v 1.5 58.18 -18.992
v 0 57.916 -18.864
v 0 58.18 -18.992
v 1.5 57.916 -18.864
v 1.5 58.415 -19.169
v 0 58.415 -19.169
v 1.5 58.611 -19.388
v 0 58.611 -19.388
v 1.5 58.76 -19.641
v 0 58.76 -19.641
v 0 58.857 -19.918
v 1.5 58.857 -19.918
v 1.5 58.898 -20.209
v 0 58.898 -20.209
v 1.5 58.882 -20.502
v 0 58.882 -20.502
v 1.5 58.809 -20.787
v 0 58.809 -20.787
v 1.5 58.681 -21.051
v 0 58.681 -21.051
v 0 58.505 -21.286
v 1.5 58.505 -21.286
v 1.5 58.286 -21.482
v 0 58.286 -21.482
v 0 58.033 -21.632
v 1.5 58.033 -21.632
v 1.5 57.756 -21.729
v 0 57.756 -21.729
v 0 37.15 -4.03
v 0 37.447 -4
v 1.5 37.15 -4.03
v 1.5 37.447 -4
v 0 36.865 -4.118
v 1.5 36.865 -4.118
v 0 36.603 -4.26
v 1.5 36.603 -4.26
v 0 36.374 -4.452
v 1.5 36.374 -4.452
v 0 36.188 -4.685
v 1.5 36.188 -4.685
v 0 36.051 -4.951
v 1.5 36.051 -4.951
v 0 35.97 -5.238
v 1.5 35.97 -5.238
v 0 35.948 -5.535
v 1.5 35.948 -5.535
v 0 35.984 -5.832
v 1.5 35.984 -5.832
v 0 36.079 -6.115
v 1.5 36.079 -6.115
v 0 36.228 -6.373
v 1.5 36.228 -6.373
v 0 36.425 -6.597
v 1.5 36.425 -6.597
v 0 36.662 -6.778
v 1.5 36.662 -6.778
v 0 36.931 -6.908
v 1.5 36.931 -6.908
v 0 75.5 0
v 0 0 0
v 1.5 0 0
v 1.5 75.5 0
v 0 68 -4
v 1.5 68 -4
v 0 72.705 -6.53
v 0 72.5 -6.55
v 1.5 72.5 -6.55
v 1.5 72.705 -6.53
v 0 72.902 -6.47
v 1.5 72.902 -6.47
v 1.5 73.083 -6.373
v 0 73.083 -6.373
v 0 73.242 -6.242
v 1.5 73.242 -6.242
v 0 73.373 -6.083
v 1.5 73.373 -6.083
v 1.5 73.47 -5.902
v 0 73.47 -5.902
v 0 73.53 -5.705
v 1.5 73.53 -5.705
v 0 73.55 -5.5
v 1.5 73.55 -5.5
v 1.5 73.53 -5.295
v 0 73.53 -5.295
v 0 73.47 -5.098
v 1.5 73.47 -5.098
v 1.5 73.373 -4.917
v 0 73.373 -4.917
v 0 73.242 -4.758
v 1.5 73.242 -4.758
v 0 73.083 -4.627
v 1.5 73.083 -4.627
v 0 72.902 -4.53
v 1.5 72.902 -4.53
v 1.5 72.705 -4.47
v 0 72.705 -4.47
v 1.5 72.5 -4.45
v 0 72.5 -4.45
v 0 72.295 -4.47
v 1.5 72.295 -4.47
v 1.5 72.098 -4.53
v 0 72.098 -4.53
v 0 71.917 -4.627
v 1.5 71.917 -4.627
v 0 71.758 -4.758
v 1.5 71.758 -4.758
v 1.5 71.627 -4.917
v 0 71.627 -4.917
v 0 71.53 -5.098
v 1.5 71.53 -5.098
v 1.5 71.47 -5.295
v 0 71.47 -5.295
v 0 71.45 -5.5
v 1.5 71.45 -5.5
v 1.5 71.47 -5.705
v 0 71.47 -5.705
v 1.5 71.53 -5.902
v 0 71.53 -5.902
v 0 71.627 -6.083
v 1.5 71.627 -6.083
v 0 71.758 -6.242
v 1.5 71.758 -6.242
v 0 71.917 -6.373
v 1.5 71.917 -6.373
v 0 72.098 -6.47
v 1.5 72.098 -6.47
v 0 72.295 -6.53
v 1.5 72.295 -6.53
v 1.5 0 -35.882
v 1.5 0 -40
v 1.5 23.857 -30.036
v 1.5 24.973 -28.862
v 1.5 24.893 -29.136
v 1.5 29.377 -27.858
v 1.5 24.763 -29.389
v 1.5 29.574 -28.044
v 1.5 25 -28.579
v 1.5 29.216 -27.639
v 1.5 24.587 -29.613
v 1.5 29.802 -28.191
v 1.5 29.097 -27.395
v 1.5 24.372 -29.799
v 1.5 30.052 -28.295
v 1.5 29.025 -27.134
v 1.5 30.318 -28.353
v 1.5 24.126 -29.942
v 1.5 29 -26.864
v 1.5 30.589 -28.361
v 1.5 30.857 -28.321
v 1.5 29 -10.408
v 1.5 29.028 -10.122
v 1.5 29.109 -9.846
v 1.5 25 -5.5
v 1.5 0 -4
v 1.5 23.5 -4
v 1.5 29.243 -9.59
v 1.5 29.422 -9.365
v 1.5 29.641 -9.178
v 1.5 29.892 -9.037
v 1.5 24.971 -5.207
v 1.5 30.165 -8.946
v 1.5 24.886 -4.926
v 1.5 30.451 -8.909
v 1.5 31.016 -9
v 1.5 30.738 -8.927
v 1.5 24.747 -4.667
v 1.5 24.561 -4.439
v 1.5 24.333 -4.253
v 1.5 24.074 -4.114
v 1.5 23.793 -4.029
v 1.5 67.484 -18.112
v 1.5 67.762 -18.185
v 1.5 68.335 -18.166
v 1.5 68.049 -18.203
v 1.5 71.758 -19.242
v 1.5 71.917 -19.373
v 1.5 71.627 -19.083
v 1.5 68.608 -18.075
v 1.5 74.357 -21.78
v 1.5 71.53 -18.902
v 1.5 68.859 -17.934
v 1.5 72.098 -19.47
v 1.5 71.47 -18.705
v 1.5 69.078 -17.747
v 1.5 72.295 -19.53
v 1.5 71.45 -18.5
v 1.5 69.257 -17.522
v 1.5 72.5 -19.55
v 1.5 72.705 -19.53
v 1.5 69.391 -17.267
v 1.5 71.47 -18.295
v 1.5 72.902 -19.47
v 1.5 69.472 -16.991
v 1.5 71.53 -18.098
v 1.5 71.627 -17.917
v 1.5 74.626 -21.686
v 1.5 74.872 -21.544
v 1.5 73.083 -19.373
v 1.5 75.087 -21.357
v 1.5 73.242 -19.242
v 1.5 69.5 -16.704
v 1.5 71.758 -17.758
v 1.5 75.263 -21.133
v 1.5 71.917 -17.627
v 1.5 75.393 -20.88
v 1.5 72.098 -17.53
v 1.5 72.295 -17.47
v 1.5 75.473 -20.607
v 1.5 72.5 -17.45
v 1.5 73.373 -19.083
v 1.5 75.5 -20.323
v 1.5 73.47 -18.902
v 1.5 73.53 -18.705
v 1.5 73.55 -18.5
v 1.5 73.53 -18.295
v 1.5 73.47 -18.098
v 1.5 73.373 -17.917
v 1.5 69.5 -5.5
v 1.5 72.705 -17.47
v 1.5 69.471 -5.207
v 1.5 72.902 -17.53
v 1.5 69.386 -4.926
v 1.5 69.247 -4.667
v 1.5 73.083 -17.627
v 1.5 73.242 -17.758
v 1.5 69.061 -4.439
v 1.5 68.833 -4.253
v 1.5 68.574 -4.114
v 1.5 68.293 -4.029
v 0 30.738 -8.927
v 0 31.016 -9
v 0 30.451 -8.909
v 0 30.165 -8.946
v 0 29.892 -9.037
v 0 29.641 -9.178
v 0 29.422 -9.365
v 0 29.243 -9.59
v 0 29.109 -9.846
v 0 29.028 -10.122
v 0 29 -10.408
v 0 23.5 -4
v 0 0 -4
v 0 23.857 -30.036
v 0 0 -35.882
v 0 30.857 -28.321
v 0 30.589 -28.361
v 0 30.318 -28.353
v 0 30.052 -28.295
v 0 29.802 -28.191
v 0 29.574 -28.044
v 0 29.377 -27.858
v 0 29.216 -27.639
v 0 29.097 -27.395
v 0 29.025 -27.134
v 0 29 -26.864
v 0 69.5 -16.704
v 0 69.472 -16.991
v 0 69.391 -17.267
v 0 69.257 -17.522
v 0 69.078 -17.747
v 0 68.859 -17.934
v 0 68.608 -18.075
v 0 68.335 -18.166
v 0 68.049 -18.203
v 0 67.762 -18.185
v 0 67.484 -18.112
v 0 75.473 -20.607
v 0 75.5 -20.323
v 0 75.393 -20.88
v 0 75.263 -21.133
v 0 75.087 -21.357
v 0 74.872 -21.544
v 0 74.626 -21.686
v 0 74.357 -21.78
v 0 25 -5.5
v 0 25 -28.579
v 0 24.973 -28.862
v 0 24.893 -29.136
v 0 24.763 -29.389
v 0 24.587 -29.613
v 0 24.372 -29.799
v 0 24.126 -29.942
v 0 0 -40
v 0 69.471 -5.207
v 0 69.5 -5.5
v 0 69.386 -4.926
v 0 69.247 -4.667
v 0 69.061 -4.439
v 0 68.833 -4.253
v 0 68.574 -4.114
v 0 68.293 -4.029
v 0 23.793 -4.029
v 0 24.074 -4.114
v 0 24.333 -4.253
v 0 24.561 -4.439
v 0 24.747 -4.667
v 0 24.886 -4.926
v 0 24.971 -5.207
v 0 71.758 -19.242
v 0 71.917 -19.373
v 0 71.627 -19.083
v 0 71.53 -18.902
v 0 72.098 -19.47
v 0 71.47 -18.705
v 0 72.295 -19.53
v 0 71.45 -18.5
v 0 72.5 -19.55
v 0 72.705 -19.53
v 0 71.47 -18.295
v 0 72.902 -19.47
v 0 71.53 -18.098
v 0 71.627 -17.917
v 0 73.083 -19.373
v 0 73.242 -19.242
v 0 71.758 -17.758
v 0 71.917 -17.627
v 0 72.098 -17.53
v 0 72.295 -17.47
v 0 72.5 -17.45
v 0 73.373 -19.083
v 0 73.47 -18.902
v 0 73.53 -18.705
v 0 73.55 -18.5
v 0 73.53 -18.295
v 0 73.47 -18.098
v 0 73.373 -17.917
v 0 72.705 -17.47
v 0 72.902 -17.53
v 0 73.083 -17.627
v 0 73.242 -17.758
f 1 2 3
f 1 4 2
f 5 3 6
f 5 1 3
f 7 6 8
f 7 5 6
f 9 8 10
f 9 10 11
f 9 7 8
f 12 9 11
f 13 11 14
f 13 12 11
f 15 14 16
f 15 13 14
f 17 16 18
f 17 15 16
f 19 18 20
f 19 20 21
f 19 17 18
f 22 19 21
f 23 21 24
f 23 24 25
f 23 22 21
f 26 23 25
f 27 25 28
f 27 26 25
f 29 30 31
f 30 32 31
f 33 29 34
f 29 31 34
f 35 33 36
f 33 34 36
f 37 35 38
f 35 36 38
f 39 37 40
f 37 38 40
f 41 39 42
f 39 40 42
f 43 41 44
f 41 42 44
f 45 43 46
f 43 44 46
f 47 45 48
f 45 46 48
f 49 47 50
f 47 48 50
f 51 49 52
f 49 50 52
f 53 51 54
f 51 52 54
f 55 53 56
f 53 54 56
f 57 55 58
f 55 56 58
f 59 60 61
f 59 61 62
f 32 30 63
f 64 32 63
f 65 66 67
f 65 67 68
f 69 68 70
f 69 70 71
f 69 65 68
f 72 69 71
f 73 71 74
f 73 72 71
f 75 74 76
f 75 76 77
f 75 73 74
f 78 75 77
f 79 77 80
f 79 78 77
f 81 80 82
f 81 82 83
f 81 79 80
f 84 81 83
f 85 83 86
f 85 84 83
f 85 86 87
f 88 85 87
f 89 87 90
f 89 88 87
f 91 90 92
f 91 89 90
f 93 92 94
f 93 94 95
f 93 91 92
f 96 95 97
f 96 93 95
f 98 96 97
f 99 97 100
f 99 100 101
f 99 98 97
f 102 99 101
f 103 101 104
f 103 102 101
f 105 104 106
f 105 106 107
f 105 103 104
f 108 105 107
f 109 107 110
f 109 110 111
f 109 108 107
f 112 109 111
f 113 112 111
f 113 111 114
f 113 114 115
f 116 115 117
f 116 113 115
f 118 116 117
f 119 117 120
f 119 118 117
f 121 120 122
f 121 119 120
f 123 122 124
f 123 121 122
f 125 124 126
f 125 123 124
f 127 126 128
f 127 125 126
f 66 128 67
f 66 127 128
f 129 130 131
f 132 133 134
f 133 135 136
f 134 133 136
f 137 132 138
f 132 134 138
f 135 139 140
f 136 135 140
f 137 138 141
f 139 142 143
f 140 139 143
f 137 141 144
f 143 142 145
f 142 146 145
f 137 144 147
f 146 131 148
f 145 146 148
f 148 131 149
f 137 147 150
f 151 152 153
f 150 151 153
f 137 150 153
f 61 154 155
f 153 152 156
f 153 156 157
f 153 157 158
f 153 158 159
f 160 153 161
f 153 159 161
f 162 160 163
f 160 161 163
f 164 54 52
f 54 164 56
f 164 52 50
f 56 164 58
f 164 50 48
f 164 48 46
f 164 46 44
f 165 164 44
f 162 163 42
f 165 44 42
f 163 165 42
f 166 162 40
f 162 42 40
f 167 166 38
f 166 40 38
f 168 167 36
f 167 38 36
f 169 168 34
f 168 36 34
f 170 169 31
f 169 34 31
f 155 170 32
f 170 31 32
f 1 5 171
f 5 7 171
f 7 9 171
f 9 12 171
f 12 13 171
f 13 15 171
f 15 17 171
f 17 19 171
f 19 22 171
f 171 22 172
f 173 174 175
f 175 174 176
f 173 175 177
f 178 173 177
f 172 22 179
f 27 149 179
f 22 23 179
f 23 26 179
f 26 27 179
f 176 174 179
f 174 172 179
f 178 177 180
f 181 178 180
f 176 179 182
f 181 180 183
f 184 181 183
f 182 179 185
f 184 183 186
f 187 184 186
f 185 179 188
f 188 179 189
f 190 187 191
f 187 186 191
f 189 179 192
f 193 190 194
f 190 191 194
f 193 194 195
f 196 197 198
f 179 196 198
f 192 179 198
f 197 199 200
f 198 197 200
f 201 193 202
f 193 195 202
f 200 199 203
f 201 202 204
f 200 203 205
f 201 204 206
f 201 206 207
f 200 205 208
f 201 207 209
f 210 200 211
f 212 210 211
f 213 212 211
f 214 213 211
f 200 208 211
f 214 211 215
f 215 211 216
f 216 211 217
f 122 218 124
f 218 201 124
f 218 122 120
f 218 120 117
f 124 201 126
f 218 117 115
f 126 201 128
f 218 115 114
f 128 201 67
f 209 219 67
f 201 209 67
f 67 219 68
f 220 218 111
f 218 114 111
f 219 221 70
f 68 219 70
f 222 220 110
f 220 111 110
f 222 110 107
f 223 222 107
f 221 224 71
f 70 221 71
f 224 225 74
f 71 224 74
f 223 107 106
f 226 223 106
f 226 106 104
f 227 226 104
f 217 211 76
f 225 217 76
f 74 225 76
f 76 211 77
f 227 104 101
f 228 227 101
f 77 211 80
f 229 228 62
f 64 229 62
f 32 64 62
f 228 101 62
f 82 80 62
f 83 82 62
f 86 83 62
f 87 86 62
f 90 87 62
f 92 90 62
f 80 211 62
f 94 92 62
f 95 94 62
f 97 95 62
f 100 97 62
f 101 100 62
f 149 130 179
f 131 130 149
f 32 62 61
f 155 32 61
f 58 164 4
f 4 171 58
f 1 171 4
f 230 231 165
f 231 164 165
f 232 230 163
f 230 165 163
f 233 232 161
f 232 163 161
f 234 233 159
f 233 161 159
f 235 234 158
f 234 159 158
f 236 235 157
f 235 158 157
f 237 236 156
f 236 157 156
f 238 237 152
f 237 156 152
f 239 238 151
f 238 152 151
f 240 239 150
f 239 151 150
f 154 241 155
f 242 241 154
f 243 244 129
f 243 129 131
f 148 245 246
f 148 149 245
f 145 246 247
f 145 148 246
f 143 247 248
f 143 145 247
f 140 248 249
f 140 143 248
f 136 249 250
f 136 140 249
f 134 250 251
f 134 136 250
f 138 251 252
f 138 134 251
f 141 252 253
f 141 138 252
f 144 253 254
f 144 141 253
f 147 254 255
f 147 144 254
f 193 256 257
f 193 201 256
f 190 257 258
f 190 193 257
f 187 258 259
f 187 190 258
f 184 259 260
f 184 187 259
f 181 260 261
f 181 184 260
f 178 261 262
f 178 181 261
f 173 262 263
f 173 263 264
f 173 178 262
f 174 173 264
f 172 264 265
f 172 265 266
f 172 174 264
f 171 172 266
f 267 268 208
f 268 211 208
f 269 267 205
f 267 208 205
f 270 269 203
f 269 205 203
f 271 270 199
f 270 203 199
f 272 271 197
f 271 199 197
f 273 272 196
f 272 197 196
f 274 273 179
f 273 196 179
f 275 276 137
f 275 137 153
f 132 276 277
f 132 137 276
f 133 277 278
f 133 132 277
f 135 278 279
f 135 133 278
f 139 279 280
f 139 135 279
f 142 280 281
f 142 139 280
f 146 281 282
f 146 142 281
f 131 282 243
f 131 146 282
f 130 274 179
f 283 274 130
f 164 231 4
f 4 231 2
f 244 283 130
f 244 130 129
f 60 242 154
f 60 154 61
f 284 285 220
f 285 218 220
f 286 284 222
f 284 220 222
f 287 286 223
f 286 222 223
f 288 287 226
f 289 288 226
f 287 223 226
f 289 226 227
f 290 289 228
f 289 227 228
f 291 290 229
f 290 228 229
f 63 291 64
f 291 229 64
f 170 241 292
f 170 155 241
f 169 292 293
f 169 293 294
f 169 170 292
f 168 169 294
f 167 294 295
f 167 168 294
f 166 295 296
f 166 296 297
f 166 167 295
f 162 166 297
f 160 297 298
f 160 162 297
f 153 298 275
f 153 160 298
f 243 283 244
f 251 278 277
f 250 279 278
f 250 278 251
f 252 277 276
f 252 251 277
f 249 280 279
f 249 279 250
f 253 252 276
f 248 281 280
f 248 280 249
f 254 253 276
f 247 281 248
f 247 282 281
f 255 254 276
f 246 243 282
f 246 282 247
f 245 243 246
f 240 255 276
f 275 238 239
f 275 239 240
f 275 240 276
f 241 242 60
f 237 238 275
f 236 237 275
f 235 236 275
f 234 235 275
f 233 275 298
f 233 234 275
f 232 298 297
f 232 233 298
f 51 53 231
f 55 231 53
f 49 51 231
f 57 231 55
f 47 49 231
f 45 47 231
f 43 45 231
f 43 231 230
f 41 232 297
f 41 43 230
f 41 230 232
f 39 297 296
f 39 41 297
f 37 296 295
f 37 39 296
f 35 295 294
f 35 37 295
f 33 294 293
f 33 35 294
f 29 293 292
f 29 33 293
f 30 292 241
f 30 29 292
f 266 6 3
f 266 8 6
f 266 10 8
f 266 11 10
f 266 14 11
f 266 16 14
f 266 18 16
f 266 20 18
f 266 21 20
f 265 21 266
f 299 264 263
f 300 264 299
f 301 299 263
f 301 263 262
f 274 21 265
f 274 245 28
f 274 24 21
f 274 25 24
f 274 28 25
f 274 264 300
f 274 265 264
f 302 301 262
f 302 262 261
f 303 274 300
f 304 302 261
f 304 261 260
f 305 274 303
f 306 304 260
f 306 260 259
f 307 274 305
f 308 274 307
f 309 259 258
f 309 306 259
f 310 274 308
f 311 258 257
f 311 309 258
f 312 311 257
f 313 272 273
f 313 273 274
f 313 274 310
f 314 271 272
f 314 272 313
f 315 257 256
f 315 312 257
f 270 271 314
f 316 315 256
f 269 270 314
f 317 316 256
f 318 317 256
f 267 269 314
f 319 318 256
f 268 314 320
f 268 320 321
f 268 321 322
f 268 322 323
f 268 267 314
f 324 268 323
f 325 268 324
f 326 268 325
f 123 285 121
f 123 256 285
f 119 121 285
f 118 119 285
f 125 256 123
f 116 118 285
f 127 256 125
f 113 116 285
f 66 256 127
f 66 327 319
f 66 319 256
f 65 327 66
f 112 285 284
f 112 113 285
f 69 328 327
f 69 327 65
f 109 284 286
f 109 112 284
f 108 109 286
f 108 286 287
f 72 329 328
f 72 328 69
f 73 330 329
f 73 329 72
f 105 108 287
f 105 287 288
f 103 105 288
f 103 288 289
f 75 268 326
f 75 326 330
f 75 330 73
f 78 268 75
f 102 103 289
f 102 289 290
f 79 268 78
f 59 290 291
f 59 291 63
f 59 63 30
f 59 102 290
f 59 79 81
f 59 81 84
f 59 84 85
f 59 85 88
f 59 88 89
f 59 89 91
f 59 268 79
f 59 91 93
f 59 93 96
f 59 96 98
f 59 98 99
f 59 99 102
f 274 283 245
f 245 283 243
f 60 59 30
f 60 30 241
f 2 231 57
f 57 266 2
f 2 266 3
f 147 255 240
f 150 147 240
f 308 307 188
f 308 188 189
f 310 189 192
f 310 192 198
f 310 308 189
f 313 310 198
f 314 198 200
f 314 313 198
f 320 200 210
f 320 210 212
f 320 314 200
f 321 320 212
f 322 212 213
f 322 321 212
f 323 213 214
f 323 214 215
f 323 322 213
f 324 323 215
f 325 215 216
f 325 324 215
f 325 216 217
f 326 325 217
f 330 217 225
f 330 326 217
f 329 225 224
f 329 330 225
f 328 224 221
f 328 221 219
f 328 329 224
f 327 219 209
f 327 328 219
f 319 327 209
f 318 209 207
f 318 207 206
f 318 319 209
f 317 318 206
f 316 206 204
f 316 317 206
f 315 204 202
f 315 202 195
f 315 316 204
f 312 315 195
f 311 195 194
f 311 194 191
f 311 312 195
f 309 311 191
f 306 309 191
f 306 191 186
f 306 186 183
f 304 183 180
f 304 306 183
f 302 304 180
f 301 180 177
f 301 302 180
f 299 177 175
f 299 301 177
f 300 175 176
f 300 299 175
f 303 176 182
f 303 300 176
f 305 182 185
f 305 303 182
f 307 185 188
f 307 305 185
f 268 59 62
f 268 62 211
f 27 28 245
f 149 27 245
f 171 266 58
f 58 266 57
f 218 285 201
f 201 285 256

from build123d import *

# Parameters (mm, degrees)
SKETCH1_R           = 1.05
BOSS_EXTRUDE1_DEPTH = 1.5
FILLET1_R           = 1.5


with BuildPart() as part:
    # Sketch1 → Boss-Extrude1 (new body)
    with BuildSketch(Plane(origin=(0, 0, 0), x_dir=(0, 0, -1), z_dir=(1, 0, 0))):
        Polygon((0, 0), (0, 75.5), (21.5, 75.5), (40, 0), (35.881667859, 0), (29.755840045, 25), (4, 25), (4, 0), align=None)
        with Locations((5.5, 72.5)):
            Circle(SKETCH1_R, mode=Mode.SUBTRACT)
        with Locations((18.5, 72.5)):
            Circle(SKETCH1_R, mode=Mode.SUBTRACT)
        Polygon((4, 69.5), (18.851866535, 69.5), (4, 29), align=None, mode=Mode.SUBTRACT)
        Polygon((8.260475549, 29), (20.558388216, 62.535546651), (28.775707595, 29), align=None, mode=Mode.SUBTRACT)
    extrude(amount=BOSS_EXTRUDE1_DEPTH)

    # Fillet1
    fillet1_edges = [part.edges().sort_by_distance(p)[0] for p in [
        (0.75, 75.5, -21.5),
        (0.75, 25, -29.755840045),
        (0.75, 25, -4),
        (0.75, 69.5, -4),
        (0.75, 29, -4),
        (0.75, 69.5, -18.851866535),
        (0.75, 29, -8.260475549),
        (0.75, 29, -28.775707595),
        (0.75, 62.535546651, -20.558388216),
    ]]
    fillet(fillet1_edges, radius=FILLET1_R)


solid = part.part
